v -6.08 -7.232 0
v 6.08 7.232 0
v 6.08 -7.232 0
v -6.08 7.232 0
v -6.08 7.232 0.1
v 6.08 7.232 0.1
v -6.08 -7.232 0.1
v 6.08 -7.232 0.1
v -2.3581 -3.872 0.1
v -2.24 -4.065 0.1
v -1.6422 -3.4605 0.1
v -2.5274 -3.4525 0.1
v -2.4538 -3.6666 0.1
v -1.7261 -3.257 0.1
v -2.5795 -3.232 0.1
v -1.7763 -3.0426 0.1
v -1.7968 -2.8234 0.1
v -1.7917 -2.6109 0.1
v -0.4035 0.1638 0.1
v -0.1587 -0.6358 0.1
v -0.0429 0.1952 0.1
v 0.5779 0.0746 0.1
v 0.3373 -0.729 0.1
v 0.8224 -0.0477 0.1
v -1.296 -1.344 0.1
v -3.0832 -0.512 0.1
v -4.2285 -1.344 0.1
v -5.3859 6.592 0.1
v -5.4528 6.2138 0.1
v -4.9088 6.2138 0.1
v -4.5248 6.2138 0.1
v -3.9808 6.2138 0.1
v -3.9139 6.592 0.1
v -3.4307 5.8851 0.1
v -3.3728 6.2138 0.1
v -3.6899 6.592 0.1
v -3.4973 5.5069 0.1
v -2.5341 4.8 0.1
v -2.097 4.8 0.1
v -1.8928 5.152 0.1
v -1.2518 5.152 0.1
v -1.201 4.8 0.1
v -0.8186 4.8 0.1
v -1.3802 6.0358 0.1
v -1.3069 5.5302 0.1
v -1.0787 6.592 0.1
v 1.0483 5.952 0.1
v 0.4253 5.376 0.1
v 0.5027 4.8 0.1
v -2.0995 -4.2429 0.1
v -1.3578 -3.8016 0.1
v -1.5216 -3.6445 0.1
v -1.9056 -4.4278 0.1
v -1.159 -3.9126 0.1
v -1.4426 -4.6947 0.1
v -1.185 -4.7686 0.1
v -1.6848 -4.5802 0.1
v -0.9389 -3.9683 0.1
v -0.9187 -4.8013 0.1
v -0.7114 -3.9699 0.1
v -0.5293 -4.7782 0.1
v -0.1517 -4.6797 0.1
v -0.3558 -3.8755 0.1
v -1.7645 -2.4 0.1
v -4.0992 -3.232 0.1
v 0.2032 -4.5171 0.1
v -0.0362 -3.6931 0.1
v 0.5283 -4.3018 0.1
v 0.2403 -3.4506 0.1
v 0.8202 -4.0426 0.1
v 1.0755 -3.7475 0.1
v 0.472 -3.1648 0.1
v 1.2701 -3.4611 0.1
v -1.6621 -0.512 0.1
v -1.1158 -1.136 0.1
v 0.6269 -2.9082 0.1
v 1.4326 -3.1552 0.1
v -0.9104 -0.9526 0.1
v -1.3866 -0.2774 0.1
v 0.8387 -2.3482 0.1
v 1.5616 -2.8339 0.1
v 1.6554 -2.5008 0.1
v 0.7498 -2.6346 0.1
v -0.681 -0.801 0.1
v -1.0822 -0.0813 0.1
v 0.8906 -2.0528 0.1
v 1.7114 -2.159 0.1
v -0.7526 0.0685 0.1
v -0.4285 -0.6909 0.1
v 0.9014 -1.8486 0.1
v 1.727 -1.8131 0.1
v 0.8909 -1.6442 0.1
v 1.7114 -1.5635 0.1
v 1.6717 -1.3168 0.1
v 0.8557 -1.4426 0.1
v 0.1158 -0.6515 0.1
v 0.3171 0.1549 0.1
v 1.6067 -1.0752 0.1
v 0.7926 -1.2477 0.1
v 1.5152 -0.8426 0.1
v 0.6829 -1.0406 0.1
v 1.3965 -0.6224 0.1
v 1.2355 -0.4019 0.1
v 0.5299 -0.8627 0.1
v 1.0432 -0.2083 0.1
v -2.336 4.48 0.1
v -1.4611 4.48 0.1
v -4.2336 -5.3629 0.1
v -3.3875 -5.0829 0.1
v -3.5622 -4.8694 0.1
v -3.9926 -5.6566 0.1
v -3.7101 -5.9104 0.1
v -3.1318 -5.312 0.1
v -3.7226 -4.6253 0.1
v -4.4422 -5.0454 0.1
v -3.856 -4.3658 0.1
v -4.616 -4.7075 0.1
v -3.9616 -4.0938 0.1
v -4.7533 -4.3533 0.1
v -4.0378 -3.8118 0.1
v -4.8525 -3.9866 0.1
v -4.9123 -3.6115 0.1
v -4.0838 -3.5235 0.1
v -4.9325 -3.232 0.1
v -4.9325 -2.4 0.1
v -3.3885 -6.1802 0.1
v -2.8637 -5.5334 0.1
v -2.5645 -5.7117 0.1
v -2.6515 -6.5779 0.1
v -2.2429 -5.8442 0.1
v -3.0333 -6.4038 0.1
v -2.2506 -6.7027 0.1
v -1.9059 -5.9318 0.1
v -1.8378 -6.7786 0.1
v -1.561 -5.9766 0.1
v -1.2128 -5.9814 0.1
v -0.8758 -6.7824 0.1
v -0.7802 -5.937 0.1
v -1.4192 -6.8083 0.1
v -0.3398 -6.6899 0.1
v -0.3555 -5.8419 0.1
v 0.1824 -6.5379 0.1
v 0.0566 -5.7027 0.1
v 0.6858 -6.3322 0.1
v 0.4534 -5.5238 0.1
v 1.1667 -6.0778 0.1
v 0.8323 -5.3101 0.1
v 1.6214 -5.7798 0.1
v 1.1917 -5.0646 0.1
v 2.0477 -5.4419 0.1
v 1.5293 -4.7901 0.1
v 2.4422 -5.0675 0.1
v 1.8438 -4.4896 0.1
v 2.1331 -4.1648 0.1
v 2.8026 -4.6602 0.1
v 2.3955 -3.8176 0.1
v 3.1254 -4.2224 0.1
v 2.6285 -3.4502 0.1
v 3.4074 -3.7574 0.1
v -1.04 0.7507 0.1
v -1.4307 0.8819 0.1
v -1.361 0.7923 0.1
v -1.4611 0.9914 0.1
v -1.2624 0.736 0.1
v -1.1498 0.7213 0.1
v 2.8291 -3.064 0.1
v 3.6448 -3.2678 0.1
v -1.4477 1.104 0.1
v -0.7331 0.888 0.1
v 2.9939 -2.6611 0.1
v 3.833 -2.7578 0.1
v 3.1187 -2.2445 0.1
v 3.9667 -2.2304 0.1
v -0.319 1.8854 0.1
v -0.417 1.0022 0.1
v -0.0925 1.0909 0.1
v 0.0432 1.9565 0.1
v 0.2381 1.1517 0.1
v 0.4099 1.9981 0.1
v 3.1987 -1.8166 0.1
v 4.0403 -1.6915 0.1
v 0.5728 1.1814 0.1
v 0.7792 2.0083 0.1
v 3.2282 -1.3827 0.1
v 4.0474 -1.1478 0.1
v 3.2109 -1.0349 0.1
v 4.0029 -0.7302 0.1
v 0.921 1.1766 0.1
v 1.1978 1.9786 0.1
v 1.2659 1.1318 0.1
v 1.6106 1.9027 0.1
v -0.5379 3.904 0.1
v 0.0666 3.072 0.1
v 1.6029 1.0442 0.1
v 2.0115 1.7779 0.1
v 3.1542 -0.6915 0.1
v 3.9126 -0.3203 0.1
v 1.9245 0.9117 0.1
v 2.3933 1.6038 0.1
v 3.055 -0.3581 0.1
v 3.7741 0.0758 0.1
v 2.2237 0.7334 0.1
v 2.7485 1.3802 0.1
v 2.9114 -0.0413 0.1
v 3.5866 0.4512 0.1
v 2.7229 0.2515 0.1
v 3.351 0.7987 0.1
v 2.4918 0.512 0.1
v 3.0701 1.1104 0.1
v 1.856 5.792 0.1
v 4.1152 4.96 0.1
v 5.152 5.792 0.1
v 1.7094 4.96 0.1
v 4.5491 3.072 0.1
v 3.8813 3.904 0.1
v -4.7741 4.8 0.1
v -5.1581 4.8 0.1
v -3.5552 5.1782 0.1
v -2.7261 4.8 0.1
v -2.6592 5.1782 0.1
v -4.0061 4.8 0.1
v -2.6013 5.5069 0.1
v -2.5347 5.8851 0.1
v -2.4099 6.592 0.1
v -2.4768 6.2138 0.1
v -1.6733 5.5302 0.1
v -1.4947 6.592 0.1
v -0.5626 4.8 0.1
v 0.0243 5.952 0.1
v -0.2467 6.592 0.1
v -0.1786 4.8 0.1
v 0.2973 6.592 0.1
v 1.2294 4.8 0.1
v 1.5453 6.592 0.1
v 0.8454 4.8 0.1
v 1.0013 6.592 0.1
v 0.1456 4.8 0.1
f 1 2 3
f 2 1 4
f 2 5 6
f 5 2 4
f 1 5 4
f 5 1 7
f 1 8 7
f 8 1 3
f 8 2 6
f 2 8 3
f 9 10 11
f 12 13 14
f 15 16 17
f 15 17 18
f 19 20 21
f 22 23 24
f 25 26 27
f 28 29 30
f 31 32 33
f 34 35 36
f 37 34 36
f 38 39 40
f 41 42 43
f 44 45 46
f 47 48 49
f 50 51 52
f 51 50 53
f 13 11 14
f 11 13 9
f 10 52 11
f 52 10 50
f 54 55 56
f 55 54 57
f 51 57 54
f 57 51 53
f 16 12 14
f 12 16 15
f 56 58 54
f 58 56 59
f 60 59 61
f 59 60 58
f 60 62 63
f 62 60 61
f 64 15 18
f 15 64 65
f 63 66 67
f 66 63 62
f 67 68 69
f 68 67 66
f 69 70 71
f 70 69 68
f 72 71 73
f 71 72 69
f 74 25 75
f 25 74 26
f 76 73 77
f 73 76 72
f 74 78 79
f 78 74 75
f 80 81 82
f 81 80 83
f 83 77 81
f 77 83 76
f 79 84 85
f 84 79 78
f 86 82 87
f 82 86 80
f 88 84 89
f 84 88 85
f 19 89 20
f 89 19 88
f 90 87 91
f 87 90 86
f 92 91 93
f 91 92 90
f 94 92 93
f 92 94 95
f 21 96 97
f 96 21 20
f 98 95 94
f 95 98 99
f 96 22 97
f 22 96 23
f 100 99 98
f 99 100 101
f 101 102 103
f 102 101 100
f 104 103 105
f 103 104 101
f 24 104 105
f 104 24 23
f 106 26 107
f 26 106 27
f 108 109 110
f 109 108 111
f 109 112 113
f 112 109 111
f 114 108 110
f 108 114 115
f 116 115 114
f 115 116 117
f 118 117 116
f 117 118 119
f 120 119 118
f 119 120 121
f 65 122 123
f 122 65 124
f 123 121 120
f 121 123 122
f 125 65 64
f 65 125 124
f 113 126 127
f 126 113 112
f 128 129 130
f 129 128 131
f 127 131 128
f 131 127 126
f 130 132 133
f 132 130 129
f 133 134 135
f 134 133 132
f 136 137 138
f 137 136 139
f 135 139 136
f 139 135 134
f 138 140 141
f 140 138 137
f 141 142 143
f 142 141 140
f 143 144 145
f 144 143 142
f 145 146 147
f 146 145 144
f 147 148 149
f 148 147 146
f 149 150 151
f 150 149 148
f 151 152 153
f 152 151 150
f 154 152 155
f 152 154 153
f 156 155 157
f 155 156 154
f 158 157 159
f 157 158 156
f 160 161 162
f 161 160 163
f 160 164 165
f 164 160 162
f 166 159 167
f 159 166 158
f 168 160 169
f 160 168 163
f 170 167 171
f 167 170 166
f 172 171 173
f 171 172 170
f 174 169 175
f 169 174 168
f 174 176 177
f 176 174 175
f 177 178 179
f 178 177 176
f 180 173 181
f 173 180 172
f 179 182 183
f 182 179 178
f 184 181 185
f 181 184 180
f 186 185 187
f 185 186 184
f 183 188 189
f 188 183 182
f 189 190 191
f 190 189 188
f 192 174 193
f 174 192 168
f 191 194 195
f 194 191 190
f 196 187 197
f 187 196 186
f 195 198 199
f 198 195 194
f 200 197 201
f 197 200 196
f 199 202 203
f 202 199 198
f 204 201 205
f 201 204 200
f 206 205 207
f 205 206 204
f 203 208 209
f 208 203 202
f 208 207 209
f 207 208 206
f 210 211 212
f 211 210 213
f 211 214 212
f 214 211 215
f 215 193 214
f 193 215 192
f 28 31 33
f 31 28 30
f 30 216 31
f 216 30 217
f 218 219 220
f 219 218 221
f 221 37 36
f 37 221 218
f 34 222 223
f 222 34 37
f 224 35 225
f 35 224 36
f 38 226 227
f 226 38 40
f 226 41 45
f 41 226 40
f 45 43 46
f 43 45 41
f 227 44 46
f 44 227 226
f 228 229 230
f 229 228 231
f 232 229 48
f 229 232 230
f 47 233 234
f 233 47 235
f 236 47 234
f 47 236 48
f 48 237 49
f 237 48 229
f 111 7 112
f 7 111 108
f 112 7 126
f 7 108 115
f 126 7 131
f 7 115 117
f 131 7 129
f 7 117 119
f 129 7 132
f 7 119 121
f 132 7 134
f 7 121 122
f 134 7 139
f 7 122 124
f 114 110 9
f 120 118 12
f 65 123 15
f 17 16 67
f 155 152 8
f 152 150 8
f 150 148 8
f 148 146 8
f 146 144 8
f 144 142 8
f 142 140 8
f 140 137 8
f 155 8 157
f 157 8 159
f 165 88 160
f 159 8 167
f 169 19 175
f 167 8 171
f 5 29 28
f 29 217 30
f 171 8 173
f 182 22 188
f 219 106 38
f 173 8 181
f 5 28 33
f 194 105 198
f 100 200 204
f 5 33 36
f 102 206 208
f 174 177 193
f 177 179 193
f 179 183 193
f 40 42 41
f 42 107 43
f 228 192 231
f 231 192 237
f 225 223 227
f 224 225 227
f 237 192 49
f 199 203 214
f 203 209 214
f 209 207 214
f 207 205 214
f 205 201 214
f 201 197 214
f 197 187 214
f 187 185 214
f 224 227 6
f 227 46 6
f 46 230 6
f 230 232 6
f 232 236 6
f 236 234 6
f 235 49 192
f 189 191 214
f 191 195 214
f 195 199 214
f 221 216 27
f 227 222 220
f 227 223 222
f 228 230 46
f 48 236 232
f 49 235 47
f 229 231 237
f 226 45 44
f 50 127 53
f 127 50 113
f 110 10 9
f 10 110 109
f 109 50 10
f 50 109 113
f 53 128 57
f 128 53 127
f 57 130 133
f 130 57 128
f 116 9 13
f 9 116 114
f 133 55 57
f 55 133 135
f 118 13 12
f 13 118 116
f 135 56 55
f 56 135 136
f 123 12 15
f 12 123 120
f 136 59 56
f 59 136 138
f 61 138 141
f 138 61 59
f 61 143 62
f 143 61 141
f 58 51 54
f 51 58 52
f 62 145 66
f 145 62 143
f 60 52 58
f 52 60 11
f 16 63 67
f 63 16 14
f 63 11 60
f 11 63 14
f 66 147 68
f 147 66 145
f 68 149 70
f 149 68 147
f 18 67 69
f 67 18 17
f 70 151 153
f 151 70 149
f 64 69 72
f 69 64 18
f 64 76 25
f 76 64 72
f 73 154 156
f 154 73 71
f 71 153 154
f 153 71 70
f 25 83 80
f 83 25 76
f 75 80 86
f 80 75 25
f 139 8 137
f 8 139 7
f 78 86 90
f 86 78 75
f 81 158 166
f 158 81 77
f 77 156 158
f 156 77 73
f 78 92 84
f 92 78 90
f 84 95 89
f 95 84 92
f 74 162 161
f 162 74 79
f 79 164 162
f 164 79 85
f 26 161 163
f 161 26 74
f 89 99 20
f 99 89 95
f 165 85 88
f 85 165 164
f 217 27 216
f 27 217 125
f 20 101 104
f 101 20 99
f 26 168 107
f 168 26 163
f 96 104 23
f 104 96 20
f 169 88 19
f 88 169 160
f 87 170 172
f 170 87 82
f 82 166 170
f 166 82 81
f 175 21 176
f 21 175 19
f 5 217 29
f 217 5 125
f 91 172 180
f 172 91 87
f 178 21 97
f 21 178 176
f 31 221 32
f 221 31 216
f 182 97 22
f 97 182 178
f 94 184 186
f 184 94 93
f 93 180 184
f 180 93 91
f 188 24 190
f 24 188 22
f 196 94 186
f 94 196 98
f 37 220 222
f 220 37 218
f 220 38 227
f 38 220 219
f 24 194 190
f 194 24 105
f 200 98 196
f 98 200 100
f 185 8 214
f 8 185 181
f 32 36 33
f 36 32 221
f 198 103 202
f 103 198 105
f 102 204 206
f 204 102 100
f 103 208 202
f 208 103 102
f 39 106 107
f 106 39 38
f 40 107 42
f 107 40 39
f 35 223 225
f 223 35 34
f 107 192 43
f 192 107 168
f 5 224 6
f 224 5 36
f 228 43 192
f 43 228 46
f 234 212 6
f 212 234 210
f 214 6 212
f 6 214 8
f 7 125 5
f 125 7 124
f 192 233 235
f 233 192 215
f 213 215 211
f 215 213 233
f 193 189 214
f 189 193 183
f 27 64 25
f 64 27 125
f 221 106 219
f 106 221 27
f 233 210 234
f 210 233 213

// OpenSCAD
// file: ../p/box5-12.scad
use <../lib.scad>
function ldraw_lib__box5_12() = [
// 0 Box with 5 Faces without Any Edges
// 0 Name: box5-12.dat
// 0 Author: Chris Dee [cwdee]
// 0 !LDRAW_ORG Primitive UPDATE 2009-02
// 0 !LICENSE Licensed under CC BY 4.0 : see CAreadme.txt
// 
// 0 BFC CERTIFY CCW
  [0,"BFC","CERTIFY"],
  [0,"BFC","CCW"],
// 
// 0 !HISTORY 2009-09-03 [PTadmin] Official Update 2009-02
// 
// 
// 4 16 1 1 1 1 1 -1 -1 1 -1 -1 1 1
  [4,16,1,1,1,1,1,-1,-1,1,-1,-1,1,1],
// 4 16 -1 0 1 1 0 1 1 1 1 -1 1 1
  [4,16,-1,0,1,1,0,1,1,1,1,-1,1,1],
// 4 16 -1 0 -1 -1 0 1 -1 1 1 -1 1 -1
  [4,16,-1,0,-1,-1,0,1,-1,1,1,-1,1,-1],
// 4 16 1 0 -1 -1 0 -1 -1 1 -1 1 1 -1
  [4,16,1,0,-1,-1,0,-1,-1,1,-1,1,1,-1],
// 4 16 1 0 1 1 0 -1 1 1 -1 1 1 1
  [4,16,1,0,1,1,0,-1,1,1,-1,1,1,1],
// 0
];
module ldraw_lib__box5_12(step=0, col=false, unit=2/5, alt=false, line=0.2, solid=!$preview)
    makepoly(ldraw_lib__box5_12(), step=step, col=col, unit=unit, alt=alt, line=line, solid=solid);
ldraw_lib__box5_12(line=0.2);
// main file
use <../lib.scad>
use <../p/box5-12.scad>
use <s/821437fs01.scad>
use <s/821437fs02.scad>
function ldraw_lib__821437g() = [
// 0 Sticker  1.5 x  1.8 with White "TEAM 5" on Black Background
// 0 Name: 821437g.dat
// 0 Author: Chris Böhnke [KnightOfTarenta]
// 0 !LDRAW_ORG Part UPDATE 2026-05
// 0 !LICENSE Licensed under CC BY 4.0 : see CAreadme.txt
// 
// 0 !HELP For B-Model:
// 0 !HELP Place on 4286.dat at 0 10 -30 1 0 0 0 .89443 -.44721 0 .44721 .89443
// 
// 0 BFC CERTIFY CCW
  [0,"BFC","CERTIFY"],
  [0,"BFC","CCW"],
// 
// 0 !KEYWORDS Bricklink 5581stk01, Brickowl 997456, Catamaran, Dragster
// 0 !KEYWORDS Magic Flash, Model Team, Rebrickable 821437, Set 5581, Speedboat
// 0 !KEYWORDS stamp
// 
// 0 !HISTORY 2026-05-31 [OrionP] Official Update 2026-05
// 
// 0 // Sticker Back
// 1 16 0 -.25 0 15.2 0 0 0 .25 0 0 0 18.08 box5-12.dat
  [1,16,0,-.25,0,15.2,0,0,0,.25,0,0,0,18.08, ldraw_lib__box5_12()],
// 
// 0 // Text Sub-Files
// 0 BFC NOCLIP
  [0,"BFC","NOCLIP"],
// 1 15 0 0 0 .8 0 0 0 1 0 0 0 .8 s\821437fs01.dat
  [1,15,0,0,0,.8,0,0,0,1,0,0,0,.8, ldraw_lib__s__821437fs01()],
// 1 0 0 0 0 .8 0 0 0 1 0 0 0 .8 s\821437fs02.dat
  [1,0,0,0,0,.8,0,0,0,1,0,0,0,.8, ldraw_lib__s__821437fs02()],
];
module ldraw_lib__821437g(step=0, col=false, unit=2/5, alt=false, line=0.2, solid=!$preview)
    makepoly(ldraw_lib__821437g(), step=step, col=col, unit=unit, alt=alt, line=line, solid=solid);
ldraw_lib__821437g(line=0.2);
